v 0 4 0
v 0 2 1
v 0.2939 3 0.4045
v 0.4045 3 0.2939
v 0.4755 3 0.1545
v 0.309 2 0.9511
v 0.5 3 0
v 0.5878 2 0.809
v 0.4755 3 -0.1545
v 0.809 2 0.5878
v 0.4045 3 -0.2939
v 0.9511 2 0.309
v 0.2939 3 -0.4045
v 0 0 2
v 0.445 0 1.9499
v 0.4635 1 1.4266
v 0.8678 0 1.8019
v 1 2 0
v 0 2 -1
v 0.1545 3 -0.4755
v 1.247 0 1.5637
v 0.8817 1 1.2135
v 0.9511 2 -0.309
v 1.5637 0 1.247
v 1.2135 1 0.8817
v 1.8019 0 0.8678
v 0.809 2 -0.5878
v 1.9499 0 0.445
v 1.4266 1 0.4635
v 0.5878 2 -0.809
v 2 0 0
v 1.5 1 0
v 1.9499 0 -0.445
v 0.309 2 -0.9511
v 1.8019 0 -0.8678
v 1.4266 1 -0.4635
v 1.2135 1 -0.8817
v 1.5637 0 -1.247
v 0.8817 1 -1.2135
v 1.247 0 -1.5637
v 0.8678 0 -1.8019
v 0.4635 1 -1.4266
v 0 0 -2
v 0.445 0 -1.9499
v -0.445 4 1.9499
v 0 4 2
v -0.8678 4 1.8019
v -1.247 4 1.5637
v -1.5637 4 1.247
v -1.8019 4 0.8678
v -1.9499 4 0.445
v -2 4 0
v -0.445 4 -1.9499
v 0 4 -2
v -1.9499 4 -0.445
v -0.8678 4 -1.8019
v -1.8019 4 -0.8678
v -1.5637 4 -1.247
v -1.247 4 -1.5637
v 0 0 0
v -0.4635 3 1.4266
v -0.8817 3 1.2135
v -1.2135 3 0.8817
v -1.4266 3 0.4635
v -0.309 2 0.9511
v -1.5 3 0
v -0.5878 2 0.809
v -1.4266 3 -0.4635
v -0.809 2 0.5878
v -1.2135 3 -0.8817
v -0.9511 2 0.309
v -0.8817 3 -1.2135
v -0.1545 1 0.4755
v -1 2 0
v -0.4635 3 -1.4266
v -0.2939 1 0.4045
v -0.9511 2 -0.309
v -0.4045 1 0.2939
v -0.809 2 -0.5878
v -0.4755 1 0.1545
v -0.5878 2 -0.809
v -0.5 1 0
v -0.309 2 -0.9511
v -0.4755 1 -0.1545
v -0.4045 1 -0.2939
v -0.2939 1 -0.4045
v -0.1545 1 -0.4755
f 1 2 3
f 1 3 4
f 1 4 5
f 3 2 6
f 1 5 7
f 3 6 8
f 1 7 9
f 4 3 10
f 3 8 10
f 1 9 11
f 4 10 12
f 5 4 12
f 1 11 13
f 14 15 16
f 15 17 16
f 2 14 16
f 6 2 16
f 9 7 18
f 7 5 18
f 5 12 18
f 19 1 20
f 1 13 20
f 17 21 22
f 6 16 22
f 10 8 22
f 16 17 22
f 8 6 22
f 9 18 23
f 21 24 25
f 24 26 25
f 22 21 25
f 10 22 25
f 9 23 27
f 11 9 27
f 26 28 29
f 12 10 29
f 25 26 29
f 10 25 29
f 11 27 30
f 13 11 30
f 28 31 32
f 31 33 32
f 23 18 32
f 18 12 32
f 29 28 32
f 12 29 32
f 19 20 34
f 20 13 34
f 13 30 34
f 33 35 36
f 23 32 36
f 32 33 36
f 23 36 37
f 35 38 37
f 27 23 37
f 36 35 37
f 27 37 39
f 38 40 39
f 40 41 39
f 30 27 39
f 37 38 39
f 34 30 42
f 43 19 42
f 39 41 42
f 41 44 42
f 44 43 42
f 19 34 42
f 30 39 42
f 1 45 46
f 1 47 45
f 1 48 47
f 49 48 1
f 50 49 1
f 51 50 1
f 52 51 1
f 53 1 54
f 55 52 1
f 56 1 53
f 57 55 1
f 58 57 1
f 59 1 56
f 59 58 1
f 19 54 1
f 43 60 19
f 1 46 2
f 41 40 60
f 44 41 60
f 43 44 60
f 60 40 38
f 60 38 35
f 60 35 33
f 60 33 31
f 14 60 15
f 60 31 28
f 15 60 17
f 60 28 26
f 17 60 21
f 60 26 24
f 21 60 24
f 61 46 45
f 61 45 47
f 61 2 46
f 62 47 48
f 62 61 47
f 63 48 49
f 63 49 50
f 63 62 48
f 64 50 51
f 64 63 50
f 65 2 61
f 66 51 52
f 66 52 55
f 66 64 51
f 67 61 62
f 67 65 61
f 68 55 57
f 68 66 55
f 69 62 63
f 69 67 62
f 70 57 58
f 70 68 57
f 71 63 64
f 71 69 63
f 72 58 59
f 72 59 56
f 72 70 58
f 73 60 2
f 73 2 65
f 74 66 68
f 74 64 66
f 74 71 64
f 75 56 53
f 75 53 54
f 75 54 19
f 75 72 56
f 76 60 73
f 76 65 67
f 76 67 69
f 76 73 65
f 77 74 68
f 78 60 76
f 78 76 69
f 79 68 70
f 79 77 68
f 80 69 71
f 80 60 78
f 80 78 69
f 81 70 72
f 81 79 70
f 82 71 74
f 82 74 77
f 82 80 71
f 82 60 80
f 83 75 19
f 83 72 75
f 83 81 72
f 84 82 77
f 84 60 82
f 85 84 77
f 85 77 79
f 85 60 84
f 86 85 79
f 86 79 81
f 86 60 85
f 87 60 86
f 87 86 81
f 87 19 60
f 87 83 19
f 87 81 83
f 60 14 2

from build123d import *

# Parameters (mm, degrees)
REVOLVE1_ANGLE = 180
REVOLVE2_ANGLE = 180


with BuildPart() as part:
    # Sketch1 → Revolve1 (revolve)
    with BuildSketch(Plane(origin=(0, 0, 0), x_dir=(0, 0, -1), z_dir=(1, 0, 0))):
        Polygon((0, 4), (-2, 0), (0, 0), align=None)
    revolve(axis=Axis((0, 0, 0), (0, 1, 0)), revolution_arc=REVOLVE1_ANGLE)

    # Sketch2 → Revolve2 (revolve)
    with BuildSketch(Plane.ZY):
        Polygon((0, 4), (2, 4), (0, 0), align=None)
    revolve(axis=Axis((0, 0, 0), (0, -1, 0)), revolution_arc=REVOLVE2_ANGLE)


solid = part.part
